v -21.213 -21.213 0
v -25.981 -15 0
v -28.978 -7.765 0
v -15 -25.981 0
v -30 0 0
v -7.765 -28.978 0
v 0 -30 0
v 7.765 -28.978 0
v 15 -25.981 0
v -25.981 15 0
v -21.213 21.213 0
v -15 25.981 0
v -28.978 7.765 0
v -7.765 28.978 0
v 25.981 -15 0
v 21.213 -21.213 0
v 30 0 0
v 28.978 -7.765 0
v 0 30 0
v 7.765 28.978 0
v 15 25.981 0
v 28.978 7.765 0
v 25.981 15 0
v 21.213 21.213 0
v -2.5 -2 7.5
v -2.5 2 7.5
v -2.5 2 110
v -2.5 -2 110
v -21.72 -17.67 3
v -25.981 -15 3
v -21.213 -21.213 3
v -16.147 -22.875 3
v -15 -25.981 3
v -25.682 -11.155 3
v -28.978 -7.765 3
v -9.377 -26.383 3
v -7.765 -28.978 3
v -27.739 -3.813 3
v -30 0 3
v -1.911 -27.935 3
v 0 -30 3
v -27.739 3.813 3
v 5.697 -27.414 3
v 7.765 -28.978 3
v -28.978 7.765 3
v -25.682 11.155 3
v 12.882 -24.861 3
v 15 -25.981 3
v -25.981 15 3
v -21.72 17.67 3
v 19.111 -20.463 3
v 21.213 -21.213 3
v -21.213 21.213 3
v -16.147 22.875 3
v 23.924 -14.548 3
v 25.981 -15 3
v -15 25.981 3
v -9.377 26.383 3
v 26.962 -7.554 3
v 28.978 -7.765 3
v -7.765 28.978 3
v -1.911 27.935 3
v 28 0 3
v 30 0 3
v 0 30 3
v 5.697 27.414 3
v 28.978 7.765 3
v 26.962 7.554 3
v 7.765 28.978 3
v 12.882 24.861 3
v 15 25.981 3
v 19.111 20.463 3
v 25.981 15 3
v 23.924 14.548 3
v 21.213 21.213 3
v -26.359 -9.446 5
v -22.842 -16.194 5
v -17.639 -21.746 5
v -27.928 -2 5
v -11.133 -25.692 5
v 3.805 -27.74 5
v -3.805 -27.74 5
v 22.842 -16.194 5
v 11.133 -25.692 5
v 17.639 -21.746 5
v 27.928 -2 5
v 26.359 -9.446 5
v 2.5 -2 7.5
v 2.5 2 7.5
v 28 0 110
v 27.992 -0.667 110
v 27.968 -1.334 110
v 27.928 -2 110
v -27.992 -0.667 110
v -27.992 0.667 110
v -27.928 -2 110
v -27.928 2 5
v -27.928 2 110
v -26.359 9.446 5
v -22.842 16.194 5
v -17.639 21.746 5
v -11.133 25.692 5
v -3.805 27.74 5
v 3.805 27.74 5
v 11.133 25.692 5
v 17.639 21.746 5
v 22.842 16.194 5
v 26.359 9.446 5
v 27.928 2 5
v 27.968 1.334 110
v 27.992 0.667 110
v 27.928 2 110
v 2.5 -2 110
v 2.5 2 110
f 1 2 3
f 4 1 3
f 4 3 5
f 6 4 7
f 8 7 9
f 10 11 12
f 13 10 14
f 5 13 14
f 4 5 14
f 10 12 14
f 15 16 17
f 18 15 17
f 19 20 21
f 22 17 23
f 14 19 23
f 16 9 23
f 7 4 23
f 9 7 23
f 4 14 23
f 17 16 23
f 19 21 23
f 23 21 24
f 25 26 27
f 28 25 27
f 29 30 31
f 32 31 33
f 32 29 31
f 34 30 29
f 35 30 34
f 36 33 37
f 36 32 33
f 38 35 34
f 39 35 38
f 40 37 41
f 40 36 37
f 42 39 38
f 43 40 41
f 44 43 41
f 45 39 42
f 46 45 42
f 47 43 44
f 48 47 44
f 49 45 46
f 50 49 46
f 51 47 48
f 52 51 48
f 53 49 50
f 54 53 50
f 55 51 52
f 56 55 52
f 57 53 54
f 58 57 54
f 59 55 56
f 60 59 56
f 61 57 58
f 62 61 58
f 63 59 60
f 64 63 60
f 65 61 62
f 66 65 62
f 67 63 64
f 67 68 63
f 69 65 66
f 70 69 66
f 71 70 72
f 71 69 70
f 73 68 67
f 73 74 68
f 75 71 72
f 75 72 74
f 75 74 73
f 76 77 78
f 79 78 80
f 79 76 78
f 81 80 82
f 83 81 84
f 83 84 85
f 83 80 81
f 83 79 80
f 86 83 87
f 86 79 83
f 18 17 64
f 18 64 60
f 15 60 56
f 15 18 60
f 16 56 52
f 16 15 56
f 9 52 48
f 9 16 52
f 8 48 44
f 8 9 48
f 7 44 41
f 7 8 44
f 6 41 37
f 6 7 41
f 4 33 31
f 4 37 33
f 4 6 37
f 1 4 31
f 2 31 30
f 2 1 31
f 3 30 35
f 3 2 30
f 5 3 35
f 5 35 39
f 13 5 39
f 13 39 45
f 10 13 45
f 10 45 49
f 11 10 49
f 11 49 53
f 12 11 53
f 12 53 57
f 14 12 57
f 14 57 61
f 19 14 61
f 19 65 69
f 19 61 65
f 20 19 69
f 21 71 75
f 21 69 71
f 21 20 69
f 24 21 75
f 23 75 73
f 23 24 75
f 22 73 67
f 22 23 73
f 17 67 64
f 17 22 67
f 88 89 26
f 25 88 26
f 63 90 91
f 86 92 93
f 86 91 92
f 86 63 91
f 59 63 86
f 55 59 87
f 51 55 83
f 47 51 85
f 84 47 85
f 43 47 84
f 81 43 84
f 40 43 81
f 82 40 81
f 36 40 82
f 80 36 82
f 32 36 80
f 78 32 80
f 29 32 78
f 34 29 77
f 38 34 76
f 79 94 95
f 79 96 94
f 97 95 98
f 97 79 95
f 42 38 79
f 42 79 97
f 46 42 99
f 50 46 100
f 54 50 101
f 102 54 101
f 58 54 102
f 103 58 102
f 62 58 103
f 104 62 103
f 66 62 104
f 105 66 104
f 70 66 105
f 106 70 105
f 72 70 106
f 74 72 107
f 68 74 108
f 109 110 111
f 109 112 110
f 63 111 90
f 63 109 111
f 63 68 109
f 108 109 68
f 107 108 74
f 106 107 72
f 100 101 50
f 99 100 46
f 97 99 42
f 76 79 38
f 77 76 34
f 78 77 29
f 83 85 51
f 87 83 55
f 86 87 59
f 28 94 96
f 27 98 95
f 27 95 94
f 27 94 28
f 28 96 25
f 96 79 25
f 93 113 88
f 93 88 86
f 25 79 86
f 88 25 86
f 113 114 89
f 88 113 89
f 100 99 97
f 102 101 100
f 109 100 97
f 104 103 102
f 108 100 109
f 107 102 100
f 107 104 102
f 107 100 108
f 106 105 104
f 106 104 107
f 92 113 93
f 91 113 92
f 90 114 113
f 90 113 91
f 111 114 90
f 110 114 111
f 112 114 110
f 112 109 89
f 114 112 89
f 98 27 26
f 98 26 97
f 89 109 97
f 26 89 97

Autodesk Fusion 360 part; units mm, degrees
sketch "Base" plane through (0, 0, 0) normal (0, 0, 1) x (1, 0, 0)
  circle A0 centre (0, 0) radius 30
  circle A1 centre (0, 0) radius 28
  dimension "d1" = 60
  dimension "d2" = 56
extrude "Extrude1" add sketch "Base" along normal blind 2 contours A1 makes body 1
extrude "Extrude2" add sketch "Base" along normal blind 113 bodies 1
sketch "Sketch2" plane through (0, 0, 0) normal (0, 0, 1) x (1, 0, 0)
  circle A0 centre (0, 0) radius 28
  line L0 (0, -2) -> (27.9285, -2)
  line L1 (-27.9285, -2) -> (0, -2)
  line L2 (0, 2) -> (-27.9285, 2)
  line L3 (27.9285, 2) -> (0, 2)
  circle A1 centre (0, 0) radius 30
extrude "Extrude3" add sketch "Sketch2" along normal blind 3 separate body makes body 2
extrude "Extrude4" add sketch "Sketch2" along normal blind 5 contours A0 L0 L1 bodies 2
extrude "Extrude5" add sketch "Sketch2" along normal blind 5 contours A0 L2 L3 bodies 2
extrude "Extrude6" add sketch "Sketch2" along normal blind 110 contours A0 L0 L1 L2 L3 bodies 2
sketch "Sketch6" plane through (0, 2, 0) normal (0, 1, 0) x (-1, 0, 0)
  line L0 (-27.9285, 5) -> (27.9285, 5)
  line L1 (27.9285, 5) -> (27.9285, 110)
  line L2 (27.9285, 110) -> (-27.9285, 110)
  line L3 (-27.9285, 110) -> (-27.9285, 5)
  line L4 (-2.5, 7.5) -> (2.5, 7.5)
  line L5 (2.5, 7.5) -> (2.5, 110)
  line L6 (-2.5, 110) -> (2.5, 110)
  line L7 (-2.5, 110) -> (-2.5, 7.5)
  dimension "d15" = 102.5
  dimension "d16" = 5
extrude "Extrude7" cut sketch "Sketch6" against normal blind 4 contours L2 L4 L5 L6 L7 bodies 2
hidden bodies 1
